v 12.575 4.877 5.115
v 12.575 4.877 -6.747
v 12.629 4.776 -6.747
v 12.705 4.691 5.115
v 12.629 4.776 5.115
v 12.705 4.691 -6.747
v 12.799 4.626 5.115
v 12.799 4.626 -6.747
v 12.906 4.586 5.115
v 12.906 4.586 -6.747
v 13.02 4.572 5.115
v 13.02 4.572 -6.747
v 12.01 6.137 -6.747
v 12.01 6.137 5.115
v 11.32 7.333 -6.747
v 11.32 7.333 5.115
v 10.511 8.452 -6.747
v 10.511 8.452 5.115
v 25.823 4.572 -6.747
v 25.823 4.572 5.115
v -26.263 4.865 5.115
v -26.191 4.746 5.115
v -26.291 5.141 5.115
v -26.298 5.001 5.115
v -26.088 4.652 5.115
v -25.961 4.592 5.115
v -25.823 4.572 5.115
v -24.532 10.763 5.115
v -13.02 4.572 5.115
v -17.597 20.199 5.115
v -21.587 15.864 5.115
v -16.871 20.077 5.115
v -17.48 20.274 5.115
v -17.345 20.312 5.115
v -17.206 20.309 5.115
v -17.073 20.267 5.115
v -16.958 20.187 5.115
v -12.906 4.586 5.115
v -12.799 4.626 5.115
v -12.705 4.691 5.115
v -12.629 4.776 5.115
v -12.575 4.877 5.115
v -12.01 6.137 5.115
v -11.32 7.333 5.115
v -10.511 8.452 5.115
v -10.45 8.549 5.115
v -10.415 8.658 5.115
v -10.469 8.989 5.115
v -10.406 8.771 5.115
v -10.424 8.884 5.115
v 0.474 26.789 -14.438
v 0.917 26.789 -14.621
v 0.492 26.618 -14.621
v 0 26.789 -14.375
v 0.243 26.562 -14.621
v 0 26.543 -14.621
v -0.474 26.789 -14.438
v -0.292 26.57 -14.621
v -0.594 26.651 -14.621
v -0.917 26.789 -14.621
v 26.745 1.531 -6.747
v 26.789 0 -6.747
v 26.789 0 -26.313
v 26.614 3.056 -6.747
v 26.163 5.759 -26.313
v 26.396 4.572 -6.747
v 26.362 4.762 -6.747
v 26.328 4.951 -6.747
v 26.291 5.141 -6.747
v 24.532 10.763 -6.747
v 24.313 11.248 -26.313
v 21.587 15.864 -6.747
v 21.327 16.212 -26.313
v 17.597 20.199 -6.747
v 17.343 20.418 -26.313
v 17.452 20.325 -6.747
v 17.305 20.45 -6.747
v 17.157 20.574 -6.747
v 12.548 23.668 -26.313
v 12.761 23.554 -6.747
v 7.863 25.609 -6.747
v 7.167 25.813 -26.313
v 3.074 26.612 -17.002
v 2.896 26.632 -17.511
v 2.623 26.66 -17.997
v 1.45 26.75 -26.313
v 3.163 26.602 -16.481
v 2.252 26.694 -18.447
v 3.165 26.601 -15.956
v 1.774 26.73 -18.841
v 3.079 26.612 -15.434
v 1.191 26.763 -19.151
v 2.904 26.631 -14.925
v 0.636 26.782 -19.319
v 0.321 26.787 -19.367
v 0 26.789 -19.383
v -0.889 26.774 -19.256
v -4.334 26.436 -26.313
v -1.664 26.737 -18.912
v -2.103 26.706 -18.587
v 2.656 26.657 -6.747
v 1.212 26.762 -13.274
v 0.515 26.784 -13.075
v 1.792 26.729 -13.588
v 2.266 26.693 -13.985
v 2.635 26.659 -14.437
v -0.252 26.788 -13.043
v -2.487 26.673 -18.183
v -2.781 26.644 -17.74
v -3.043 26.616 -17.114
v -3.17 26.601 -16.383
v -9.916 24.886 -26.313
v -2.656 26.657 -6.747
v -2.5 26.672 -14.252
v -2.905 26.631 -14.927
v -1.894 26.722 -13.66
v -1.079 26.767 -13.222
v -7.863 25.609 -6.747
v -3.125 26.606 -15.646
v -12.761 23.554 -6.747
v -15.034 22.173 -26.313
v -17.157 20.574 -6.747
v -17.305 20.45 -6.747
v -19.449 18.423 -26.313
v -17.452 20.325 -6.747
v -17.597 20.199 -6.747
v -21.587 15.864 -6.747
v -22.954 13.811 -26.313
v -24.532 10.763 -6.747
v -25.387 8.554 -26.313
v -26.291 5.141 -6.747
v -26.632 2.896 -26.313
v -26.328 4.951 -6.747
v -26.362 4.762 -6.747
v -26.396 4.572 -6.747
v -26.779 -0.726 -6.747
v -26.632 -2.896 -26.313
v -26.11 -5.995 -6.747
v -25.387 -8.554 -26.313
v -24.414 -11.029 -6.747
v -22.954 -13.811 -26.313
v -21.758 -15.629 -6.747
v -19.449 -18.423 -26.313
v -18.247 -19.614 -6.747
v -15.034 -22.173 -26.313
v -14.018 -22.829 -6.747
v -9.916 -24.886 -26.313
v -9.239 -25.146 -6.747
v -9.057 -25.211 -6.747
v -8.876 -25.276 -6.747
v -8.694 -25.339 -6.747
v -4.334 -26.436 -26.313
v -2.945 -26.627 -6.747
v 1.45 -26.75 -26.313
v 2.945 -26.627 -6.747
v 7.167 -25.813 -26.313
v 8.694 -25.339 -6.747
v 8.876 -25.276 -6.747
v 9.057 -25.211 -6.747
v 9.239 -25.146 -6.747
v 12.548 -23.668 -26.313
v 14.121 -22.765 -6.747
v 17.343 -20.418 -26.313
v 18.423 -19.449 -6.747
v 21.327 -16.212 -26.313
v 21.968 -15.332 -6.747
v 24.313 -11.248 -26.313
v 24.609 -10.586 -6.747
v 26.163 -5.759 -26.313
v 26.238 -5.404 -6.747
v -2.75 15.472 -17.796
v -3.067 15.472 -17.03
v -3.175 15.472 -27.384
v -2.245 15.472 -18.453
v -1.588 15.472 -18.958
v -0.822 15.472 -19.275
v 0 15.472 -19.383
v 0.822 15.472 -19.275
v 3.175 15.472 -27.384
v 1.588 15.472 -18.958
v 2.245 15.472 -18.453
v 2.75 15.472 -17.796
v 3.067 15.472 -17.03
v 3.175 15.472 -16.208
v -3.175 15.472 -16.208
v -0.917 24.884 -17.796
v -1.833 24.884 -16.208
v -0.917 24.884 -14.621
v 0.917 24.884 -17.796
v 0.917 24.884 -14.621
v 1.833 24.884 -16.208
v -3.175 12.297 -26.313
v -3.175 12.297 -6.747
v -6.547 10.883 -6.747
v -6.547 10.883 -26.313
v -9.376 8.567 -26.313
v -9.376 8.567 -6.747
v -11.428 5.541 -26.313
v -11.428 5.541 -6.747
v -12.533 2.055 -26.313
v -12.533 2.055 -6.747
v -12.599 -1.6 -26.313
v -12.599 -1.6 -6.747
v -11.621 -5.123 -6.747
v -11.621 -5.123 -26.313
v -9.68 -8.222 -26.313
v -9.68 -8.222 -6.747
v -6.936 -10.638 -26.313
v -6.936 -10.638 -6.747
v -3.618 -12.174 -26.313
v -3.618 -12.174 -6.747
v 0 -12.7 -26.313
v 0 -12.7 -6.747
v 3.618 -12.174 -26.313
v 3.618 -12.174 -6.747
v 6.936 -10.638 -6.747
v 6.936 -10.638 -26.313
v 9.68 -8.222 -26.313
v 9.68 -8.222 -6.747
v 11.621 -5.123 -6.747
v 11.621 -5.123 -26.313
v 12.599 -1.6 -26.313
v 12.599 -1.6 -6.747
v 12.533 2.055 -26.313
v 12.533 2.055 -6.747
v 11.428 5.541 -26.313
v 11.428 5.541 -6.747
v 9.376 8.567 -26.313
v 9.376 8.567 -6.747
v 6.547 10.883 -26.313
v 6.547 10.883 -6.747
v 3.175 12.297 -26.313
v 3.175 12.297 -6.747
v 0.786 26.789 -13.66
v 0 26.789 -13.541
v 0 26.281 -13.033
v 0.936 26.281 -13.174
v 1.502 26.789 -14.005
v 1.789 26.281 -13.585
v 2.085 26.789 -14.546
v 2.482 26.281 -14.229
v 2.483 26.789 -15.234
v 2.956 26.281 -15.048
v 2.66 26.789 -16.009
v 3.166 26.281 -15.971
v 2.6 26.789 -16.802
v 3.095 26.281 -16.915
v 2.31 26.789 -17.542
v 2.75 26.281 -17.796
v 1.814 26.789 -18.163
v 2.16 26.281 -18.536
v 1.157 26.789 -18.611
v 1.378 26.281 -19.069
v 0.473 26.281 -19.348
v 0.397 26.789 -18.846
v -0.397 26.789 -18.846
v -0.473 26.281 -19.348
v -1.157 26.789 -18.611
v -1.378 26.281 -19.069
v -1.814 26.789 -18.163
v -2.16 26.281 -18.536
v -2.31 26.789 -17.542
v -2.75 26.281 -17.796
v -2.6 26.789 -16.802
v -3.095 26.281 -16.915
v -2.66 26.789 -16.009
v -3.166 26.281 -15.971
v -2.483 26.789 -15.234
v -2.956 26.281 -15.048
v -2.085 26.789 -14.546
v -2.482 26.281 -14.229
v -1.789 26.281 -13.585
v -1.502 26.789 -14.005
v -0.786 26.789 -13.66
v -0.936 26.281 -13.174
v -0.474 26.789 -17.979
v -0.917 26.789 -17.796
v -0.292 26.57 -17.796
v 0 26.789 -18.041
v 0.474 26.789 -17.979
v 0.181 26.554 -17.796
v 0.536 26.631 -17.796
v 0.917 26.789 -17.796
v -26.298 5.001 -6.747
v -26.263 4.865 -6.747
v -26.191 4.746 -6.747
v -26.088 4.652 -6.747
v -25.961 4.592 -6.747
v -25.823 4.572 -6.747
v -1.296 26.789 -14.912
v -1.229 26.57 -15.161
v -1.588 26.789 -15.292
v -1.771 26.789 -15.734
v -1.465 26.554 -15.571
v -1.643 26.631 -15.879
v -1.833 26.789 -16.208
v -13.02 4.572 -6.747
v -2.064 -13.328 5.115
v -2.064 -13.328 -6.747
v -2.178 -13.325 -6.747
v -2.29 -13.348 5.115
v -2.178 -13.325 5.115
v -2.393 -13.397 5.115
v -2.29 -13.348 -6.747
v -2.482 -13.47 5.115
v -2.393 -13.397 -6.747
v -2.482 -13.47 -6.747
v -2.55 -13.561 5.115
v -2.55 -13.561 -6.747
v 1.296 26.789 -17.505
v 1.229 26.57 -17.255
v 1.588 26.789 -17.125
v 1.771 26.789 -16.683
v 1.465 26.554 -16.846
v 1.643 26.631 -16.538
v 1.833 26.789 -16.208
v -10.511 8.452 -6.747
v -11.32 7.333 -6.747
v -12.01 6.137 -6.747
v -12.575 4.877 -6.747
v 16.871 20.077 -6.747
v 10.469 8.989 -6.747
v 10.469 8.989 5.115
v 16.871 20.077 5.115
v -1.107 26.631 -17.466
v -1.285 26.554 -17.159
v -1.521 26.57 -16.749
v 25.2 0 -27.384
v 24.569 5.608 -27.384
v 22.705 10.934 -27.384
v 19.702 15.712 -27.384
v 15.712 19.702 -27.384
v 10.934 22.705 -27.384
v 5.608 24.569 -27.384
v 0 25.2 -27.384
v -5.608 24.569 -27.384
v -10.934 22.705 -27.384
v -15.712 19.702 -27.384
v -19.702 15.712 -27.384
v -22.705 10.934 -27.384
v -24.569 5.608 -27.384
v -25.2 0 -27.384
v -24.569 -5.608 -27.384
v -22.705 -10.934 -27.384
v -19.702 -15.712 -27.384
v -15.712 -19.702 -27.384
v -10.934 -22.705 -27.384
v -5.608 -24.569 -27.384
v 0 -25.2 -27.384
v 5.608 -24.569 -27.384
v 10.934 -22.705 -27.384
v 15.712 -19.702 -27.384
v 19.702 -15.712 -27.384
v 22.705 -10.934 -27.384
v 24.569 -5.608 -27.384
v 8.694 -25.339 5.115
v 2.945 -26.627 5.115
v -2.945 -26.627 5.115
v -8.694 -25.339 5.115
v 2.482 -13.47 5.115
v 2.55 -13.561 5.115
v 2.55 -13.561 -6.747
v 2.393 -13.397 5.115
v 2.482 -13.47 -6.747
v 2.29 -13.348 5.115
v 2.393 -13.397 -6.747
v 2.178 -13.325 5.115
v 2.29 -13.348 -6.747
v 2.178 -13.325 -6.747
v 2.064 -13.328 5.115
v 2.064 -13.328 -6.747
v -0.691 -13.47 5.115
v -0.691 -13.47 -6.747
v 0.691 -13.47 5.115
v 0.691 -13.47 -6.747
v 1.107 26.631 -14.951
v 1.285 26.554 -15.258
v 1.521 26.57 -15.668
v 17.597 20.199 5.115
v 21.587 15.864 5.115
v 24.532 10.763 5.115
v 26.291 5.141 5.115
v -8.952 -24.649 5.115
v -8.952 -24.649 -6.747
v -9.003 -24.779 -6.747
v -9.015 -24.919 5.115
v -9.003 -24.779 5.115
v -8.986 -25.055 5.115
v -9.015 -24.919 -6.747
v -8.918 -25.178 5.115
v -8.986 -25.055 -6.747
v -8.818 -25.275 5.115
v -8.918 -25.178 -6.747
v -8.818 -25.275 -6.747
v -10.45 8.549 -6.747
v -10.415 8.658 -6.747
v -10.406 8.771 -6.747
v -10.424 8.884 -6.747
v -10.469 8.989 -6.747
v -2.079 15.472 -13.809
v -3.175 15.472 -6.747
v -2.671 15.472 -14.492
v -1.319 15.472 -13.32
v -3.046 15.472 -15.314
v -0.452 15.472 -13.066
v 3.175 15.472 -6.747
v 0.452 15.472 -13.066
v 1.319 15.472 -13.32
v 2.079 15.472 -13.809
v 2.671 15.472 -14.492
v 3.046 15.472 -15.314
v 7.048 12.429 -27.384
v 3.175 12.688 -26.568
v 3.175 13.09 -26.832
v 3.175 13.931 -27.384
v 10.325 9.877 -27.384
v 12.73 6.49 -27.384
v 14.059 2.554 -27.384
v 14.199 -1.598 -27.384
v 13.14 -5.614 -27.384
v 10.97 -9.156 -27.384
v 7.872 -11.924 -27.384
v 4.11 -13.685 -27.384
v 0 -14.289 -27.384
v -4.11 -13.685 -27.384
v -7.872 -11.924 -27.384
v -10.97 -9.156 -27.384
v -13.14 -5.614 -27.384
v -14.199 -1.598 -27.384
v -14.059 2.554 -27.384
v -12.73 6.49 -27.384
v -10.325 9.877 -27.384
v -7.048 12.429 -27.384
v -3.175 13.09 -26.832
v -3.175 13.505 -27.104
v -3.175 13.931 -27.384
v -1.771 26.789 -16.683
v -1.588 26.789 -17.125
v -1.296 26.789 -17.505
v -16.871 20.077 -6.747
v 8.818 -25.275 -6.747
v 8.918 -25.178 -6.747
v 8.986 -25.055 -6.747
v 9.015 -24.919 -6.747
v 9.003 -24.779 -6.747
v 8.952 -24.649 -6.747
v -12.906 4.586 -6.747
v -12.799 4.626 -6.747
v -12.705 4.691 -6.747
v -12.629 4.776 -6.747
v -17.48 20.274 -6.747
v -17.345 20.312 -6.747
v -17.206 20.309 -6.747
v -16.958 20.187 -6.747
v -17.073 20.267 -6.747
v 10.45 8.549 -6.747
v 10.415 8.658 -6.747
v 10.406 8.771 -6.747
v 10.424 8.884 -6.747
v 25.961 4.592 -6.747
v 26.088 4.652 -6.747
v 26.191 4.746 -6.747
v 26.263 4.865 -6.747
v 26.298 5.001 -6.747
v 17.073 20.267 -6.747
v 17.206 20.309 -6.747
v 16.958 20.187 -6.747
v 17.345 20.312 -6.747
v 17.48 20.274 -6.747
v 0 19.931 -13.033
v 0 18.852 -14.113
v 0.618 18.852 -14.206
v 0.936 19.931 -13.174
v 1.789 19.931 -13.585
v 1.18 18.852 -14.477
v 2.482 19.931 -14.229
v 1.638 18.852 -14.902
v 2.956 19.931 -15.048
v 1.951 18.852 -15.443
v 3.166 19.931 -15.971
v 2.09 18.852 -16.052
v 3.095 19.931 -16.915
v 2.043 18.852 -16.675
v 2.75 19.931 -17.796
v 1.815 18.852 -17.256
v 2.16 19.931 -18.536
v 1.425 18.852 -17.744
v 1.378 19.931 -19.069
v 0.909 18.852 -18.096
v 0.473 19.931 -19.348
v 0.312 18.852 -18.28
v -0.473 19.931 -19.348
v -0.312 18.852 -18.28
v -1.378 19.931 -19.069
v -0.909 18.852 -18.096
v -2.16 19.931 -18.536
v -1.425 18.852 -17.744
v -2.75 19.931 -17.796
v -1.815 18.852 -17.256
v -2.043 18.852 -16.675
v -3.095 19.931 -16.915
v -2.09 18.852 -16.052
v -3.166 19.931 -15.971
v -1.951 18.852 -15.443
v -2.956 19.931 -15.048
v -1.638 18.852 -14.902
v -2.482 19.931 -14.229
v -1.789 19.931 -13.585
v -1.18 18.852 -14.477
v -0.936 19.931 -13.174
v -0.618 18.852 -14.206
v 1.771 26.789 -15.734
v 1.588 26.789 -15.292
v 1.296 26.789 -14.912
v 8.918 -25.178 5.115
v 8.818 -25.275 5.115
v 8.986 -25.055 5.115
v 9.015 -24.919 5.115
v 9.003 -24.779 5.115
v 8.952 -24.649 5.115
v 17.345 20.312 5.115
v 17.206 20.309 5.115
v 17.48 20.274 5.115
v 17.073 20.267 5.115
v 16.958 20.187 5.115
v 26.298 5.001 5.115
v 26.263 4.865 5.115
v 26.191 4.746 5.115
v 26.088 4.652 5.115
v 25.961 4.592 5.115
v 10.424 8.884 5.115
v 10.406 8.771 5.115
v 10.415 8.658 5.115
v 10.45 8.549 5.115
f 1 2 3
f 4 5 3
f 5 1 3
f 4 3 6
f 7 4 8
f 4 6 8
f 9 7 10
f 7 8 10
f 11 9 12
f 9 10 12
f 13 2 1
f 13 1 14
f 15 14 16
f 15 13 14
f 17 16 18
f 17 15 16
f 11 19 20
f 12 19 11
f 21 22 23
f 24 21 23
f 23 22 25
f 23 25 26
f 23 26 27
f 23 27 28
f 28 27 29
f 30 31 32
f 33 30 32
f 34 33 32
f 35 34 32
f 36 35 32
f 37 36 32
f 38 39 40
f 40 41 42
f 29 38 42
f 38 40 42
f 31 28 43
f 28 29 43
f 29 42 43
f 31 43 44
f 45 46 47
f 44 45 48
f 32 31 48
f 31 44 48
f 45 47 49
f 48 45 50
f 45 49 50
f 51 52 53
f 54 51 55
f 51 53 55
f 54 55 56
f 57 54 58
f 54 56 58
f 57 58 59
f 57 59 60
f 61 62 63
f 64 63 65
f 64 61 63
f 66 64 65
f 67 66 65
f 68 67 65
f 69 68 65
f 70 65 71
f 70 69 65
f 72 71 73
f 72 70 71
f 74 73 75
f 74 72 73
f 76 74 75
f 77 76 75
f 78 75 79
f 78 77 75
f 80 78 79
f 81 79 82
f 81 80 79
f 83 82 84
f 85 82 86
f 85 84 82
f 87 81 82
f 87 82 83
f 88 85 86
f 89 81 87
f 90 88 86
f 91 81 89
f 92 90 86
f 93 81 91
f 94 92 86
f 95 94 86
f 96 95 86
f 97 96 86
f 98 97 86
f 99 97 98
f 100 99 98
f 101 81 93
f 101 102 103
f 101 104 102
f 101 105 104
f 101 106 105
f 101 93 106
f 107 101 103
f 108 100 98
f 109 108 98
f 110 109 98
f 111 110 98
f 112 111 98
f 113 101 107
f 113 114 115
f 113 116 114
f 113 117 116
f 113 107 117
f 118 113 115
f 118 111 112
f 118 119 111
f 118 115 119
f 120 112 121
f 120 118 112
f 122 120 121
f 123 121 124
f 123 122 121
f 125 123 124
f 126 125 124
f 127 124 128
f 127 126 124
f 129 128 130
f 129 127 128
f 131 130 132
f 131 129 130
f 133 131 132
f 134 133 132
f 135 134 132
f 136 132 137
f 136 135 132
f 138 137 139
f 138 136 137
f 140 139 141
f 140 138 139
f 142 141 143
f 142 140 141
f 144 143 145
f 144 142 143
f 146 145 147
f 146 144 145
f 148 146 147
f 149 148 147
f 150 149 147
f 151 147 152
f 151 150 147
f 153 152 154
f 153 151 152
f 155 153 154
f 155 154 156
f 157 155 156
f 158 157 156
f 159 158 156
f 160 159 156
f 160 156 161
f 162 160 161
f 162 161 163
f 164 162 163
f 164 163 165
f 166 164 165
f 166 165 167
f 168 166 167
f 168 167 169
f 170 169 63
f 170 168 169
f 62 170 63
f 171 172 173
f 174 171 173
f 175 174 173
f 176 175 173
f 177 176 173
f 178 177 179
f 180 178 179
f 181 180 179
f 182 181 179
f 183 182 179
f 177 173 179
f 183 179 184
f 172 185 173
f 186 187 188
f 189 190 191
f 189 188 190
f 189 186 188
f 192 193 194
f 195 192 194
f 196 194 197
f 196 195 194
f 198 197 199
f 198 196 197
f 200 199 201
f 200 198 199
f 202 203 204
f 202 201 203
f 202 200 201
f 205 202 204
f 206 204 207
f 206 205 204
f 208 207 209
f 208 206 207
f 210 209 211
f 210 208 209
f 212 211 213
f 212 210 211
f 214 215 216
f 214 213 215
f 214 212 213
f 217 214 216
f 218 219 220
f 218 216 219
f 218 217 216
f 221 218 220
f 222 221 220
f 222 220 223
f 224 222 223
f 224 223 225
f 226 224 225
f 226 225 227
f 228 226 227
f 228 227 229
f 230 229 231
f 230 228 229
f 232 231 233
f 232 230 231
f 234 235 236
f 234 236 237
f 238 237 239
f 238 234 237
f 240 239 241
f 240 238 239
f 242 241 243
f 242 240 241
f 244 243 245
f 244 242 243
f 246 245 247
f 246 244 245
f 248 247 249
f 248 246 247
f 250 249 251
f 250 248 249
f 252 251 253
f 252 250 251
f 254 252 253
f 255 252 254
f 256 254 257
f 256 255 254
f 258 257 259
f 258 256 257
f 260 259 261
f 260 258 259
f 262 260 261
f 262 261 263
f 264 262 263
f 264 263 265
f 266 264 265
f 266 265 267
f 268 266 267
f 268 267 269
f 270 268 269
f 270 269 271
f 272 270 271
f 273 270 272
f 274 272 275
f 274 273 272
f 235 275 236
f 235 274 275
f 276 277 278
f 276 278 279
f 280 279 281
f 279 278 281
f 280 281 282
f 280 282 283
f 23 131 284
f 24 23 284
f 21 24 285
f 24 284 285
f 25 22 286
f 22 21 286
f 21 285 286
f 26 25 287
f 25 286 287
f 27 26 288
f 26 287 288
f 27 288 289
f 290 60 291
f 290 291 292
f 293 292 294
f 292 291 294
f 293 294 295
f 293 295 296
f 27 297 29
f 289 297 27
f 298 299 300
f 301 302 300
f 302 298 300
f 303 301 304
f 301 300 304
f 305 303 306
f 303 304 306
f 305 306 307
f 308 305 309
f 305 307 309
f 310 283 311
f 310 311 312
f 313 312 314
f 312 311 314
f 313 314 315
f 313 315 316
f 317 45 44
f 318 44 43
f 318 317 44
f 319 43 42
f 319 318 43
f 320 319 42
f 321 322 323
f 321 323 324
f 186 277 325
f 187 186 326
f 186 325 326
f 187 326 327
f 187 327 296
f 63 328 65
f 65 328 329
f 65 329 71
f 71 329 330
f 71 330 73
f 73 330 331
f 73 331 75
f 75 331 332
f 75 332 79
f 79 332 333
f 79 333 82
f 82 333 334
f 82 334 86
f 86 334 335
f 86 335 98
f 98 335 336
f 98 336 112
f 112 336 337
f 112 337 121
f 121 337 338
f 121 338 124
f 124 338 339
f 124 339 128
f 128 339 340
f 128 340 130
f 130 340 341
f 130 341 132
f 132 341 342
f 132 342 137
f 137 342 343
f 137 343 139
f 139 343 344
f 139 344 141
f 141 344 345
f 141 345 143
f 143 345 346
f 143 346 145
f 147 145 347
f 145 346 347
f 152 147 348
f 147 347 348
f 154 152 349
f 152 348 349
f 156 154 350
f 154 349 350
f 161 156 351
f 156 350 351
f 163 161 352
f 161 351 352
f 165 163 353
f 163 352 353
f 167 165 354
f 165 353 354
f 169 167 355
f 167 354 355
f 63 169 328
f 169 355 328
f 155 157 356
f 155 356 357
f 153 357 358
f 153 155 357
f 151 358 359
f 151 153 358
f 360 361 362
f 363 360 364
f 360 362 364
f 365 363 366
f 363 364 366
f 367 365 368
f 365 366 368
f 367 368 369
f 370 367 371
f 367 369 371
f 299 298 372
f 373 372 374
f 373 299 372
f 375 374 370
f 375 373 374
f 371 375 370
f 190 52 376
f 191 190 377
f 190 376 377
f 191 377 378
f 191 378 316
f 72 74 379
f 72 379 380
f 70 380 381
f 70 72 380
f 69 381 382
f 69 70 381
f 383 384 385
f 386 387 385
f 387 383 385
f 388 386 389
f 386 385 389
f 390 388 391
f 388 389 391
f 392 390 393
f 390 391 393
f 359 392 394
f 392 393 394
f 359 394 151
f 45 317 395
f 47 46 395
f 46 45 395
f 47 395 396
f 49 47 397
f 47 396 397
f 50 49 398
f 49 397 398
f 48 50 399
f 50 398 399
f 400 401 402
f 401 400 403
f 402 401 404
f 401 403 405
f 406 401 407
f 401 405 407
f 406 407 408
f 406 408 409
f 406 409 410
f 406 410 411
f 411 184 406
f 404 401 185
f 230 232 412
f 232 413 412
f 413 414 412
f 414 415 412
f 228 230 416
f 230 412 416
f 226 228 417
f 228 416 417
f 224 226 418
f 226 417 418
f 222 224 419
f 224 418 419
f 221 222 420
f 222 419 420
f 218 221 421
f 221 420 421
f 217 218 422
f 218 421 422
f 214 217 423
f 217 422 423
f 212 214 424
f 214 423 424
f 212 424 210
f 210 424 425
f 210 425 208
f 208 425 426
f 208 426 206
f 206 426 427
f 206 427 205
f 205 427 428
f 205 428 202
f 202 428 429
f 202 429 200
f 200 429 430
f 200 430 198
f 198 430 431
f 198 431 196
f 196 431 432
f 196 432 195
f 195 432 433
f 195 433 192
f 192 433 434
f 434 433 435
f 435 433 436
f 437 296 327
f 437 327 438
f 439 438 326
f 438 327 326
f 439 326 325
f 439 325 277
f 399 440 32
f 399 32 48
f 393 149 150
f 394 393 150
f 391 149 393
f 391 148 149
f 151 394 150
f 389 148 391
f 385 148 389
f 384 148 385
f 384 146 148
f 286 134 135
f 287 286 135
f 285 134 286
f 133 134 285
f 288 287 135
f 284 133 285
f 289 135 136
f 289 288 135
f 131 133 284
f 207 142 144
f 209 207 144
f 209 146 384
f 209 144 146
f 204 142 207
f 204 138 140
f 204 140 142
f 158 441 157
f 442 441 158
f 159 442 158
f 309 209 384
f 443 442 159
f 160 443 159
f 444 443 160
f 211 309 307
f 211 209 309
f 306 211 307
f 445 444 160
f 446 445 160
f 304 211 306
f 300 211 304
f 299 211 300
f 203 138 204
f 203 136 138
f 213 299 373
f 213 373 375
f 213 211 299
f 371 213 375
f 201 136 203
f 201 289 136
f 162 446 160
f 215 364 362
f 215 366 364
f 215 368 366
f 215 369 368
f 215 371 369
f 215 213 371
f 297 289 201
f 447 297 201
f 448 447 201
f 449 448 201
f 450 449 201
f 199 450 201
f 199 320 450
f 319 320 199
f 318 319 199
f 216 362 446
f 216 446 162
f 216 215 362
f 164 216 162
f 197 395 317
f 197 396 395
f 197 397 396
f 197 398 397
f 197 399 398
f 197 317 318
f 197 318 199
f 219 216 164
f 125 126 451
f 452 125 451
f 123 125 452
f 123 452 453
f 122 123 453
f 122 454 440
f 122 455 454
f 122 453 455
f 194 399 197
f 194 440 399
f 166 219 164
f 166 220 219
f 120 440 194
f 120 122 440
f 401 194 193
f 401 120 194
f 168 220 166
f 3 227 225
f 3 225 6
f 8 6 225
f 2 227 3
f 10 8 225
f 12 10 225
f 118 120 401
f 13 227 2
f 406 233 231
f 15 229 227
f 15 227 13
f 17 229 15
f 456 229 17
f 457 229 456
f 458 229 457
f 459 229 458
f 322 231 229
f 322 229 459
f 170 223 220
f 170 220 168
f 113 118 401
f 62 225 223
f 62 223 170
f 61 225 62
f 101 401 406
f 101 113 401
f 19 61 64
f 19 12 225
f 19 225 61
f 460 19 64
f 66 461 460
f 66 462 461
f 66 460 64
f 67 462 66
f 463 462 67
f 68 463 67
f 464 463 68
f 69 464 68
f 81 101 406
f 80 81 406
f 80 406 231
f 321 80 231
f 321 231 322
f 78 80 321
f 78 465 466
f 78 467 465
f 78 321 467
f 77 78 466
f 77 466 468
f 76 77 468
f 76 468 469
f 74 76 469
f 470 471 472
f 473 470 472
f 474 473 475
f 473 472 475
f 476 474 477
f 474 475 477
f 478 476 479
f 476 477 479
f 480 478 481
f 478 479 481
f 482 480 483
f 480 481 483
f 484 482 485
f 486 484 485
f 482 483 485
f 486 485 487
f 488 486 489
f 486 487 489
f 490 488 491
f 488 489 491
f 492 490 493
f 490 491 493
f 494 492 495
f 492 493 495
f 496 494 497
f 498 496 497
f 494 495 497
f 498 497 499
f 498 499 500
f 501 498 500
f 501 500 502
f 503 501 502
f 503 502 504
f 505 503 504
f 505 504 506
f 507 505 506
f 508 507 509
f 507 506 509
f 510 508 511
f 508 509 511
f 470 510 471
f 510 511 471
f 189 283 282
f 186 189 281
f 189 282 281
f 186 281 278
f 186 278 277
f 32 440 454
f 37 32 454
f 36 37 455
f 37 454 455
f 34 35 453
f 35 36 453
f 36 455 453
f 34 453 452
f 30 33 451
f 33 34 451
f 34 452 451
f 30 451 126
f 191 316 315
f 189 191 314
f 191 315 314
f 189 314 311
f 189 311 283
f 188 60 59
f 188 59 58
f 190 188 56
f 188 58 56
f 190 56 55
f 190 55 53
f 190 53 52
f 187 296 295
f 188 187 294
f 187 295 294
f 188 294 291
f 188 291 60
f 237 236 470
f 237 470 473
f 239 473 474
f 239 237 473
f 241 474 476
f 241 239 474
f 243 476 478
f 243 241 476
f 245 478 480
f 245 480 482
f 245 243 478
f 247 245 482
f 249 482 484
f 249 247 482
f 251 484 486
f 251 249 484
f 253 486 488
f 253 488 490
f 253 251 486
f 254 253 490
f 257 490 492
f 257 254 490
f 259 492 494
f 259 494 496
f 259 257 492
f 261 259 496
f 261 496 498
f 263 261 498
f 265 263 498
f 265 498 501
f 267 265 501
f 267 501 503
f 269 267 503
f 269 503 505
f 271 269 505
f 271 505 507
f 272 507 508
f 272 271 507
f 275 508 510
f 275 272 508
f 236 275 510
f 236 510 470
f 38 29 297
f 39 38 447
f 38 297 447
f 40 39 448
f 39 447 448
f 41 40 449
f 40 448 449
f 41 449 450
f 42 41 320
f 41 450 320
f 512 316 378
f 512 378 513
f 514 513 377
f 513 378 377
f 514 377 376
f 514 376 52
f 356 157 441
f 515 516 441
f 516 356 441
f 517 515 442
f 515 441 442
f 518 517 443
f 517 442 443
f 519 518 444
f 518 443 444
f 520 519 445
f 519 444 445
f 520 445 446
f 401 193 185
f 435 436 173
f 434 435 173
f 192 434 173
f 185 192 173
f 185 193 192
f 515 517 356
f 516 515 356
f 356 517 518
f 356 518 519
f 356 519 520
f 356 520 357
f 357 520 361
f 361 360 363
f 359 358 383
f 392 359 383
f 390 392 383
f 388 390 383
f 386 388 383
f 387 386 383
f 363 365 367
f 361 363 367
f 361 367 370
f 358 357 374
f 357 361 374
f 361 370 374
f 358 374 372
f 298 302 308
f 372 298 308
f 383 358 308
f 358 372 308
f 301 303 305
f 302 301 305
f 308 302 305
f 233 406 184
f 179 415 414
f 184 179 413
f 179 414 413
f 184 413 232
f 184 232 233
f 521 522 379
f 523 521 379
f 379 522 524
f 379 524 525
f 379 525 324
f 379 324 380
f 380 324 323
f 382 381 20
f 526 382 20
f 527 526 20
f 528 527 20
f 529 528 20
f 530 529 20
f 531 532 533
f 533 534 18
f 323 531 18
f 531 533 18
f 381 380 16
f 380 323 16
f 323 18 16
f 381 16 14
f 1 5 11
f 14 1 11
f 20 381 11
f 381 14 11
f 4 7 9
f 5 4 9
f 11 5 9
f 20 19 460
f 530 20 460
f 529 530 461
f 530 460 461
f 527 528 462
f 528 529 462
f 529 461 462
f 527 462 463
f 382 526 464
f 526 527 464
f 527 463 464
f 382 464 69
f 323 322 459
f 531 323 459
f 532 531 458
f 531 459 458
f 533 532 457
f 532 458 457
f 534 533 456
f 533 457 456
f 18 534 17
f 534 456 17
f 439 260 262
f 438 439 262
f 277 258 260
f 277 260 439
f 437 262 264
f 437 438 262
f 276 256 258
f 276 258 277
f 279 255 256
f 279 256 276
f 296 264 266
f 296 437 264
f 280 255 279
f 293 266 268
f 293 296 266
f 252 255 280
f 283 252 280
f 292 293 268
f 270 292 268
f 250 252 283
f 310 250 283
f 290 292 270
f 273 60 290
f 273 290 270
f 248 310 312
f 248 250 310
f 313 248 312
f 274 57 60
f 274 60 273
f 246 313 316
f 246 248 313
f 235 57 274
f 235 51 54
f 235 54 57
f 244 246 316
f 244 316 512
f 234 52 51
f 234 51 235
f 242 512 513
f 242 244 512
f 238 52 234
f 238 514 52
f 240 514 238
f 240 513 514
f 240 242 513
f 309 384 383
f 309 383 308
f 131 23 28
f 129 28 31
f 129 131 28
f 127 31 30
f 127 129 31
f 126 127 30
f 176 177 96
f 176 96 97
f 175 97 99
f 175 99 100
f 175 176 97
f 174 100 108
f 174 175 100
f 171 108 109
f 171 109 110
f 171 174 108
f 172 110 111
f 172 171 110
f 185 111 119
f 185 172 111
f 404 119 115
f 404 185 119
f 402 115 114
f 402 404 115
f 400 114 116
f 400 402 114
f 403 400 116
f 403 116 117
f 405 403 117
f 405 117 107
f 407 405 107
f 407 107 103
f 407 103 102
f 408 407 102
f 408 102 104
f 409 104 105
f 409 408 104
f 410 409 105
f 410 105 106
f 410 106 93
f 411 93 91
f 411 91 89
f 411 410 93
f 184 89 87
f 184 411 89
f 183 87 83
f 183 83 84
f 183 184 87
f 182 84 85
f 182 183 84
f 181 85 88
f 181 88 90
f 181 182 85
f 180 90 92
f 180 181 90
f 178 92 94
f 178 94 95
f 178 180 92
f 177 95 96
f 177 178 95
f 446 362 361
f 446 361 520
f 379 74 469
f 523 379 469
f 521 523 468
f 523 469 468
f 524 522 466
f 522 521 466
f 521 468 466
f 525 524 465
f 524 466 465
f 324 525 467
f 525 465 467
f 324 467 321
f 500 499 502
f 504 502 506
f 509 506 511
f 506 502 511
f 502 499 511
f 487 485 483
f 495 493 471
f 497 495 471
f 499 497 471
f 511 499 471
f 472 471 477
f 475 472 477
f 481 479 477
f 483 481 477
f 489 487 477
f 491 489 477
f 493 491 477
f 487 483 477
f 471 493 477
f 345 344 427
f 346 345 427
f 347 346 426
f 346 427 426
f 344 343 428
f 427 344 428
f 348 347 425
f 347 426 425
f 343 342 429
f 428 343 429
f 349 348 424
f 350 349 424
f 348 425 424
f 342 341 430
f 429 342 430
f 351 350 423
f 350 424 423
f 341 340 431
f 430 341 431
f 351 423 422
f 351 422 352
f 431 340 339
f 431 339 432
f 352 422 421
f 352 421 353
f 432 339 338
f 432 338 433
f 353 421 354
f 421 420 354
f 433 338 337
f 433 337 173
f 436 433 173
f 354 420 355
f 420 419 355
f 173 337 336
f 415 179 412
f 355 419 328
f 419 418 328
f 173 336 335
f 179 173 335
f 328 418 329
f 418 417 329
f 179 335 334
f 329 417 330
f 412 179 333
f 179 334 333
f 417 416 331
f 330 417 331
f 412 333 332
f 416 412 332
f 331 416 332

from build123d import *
from OCP.BRepFilletAPI import BRepFilletAPI_MakeChamfer

# Parameters (mm, degrees)
BOSS_EXTRUDE1_START      = -6.746875
SKETCH1_R                = 26.7890625
BOSS_EXTRUDE1_DEPTH      = 20.6375
BOSS_EXTRUDE2_DEPTH      = 11.8618
FILLET1_R                = 0.476990821
CIRPATTERN1_COUNT        = 3
FILLET1_OF_CIRPATTERN1_R = 0.476990821
CUT_EXTRUDE5_DEPTH       = 47.746248335
CUT_EXTRUDE5_DEPTH_BACK  = 47.746248335
SKETCH15_R               = 12.7
CHAMFER1_SIZE            = 1.0715625
CHAMFER1_SIZE2           = 1.588656738
CUT_EXTRUDE1_DEPTH       = 47.746248335
CUT_EXTRUDE1_DEPTH_BACK  = 47.746248335
SKETCH5_R                = 3.175
CUT_EXTRUDE2_DEPTH       = 47.746248335
SKETCH6_R                = 3.175
BOSS_EXTRUDE3_DEPTH      = 7.9375
CUT_EXTRUDE3_DEPTH       = 1.905
CHAMFER3_SIZE            = 0.508
CHAMFER4_SIZE            = 1.0795


with BuildPart() as part:
    # Sketch1 → Boss-Extrude1 (new body)
    with BuildSketch(Plane.XY.offset(BOSS_EXTRUDE1_START)):
        Circle(SKETCH1_R)
    extrude(amount=-BOSS_EXTRUDE1_DEPTH)

    # Sketch2 → Boss-Extrude2 (add)
    with BuildSketch(Plane.XY.offset(-6.746875)):
        with BuildLine():
            Line((-9.238549561, -25.145637229), (-2.384954104, -13.274861682))
            ThreePointArc((-2.384954104, -13.274861682), (0, -13.4874), (2.384954104, -13.274861682))
            Line((2.384954104, -13.274861682), (9.238549561, -25.145637229))
            ThreePointArc((9.238549561, -25.145637229), (0, -26.7890625), (-9.238549561, -25.145637229))
        make_face()
    boss_extrude2 = extrude(amount=BOSS_EXTRUDE2_DEPTH)

    # Fillet1
    # the kernel refuses this fillet: 0.476990821 mm, written as the material it takes off along each edge
    with BuildSketch(Plane(origin=(-9.238549561, -25.145637229, -6.746875), x_dir=(0.9423194959651416, -0.33471475546202245, 0), z_dir=(0, 0, 1))) as fillet1_piece_1:
        with BuildLine():
            CenterArc((0.572952448, 0.476963054), FILLET1_R, 169.55519331, 101.063030663)
            Line((0.103865366, 0.563435893), (0, 0))
            ThreePointArc((0, 0), (0.28904955, -0.001559444), (0.5780991, 0))
        make_face()
    extrude(amount=13.307047751, mode=Mode.SUBTRACT)
    with BuildSketch(Plane(origin=(9.238549561, -25.145637229, -6.746875), x_dir=(-0.9423194959651411, -0.3347147554620237, 0), z_dir=(0, 0, 1))) as fillet1_piece_2:
        with BuildLine():
            CenterArc((0.572952448, -0.476963054), FILLET1_R, 89.381776027, 101.063030663)
            Line((0.103865366, -0.563435893), (0, 0))
            ThreePointArc((0, 0), (0.28904955, 0.001559444), (0.5780991, 0))
        make_face()
    extrude(amount=13.307047751, mode=Mode.SUBTRACT)
    with BuildSketch(Plane(origin=(2.384954104, -13.274861682, -6.746875), x_dir=(0.49999999999999706, -0.8660254037844404, 0), z_dir=(0, 0, 1))) as fillet1_piece_3:
        with BuildLine():
            CenterArc((0.330829178, -0.476990821), FILLET1_R, 90, 68.803855098)
            ThreePointArc((-0.113892323, -0.304529143), (-0.056028498, -0.152607773), (0, 0))
            Line((0, 0), (0.330829178, 0))
        make_face()
    extrude(amount=12.688872944, mode=Mode.SUBTRACT)
    with BuildSketch(Plane(origin=(-2.384954104, -13.274861682, -6.746875), x_dir=(0.9863015455813384, -0.16495229972286882, 0), z_dir=(0, 0, 1))) as fillet1_piece_4:
        with BuildLine():
            CenterArc((0.330879129, -0.476956172), FILLET1_R, 90.690608377, 68.803855098)
            Line((-0.115888763, -0.309867293), (0, 0))
            ThreePointArc((0, 0), (0.162564956, -0.000979741), (0.325129912, 0))
        make_face()
    extrude(amount=12.688872944, mode=Mode.SUBTRACT)

    # CirPattern1: Boss-Extrude2 ×3 about axis
    cirpattern1_axis = Axis((0, 0, 0), (0, 0, 1))
    for i in range(1, CIRPATTERN1_COUNT):
        add(boss_extrude2.rotate(cirpattern1_axis, i * 360 / CIRPATTERN1_COUNT))

    # Fillet1 of CirPattern1
    # the kernel refuses this fillet: 0.476990821 mm, written as the material it takes off along each edge
    with BuildSketch(Plane(origin=(26.396035415, 4.572, -6.746875), x_dir=(-0.18128826673094764, 0.9834299997181745, 0), z_dir=(0, 0, 1)), Plane(origin=(-17.157485854, 20.573637229, -6.746875), x_dir=(-0.761031229234182, -0.6487152442561451, 0), z_dir=(0, 0, 1))) as fillet1_of_cirpattern1_piece_1:
        with BuildLine():
            CenterArc((0.572952448, 0.476963054), FILLET1_OF_CIRPATTERN1_R, 169.55519331, 101.063030663)
            Line((0.103865366, 0.563435893), (0, 0))
            ThreePointArc((0, 0), (0.28904955, -0.001559444), (0.5780991, 0))
        make_face()
    extrude(amount=13.307047751, mode=Mode.SUBTRACT)
    with BuildSketch(Plane(origin=(17.157485854, 20.573637229, -6.746875), x_dir=(0.7610312292341833, -0.6487152442561435, 0), z_dir=(0, 0, 1)), Plane(origin=(-26.396035415, 4.572, -6.746875), x_dir=(0.181288266730962, 0.9834299997181718, 0), z_dir=(0, 0, 1))) as fillet1_of_cirpattern1_piece_2:
        with BuildLine():
            CenterArc((0.572952448, -0.476963054), FILLET1_OF_CIRPATTERN1_R, 89.381776027, 101.063030663)
            Line((0.103865366, -0.563435893), (0, 0))
            ThreePointArc((0, 0), (0.28904955, 0.001559444), (0.5780991, 0))
        make_face()
    extrude(amount=13.307047751, mode=Mode.SUBTRACT)
    with BuildSketch(Plane(origin=(10.303890396, 8.702861682, -6.746875), x_dir=(0.5000000000000006, 0.8660254037844383, 0), z_dir=(0, 0, 1)), Plane(origin=(-12.688844501, 4.572, -6.746875), x_dir=(-1, 0, 0), z_dir=(0, 0, 1))) as fillet1_of_cirpattern1_piece_3:
        with BuildLine():
            CenterArc((0.330829178, -0.476990821), FILLET1_OF_CIRPATTERN1_R, 90, 68.803855098)
            ThreePointArc((-0.113892323, -0.304529143), (-0.056028498, -0.152607773), (0, 0))
            Line((0, 0), (0.330829178, 0))
        make_face()
    extrude(amount=12.688872944, mode=Mode.SUBTRACT)
    with BuildSketch(Plane(origin=(12.688844501, 4.572, -6.746875), x_dir=(-0.3502978908180006, 0.9366383441267288, 0), z_dir=(0, 0, 1)), Plane(origin=(-10.303890396, 8.702861682, -6.746875), x_dir=(-0.6360036547633316, -0.7716860444038657, 0), z_dir=(0, 0, 1))) as fillet1_of_cirpattern1_piece_4:
        with BuildLine():
            CenterArc((0.330879129, -0.476956172), FILLET1_OF_CIRPATTERN1_R, 90.690608377, 68.803855098)
            Line((-0.115888763, -0.309867293), (0, 0))
            ThreePointArc((0, 0), (0.162564956, -0.000979741), (0.325129912, 0))
        make_face()
    extrude(amount=12.688872944, mode=Mode.SUBTRACT)

    # Sketch15 → Cut-Extrude5 (cut, two sides: drawn at the far end of the back side and taken through both)
    with BuildSketch(Plane.XY.offset(-CUT_EXTRUDE5_DEPTH_BACK)):
        Circle(SKETCH15_R)
    extrude(amount=CUT_EXTRUDE5_DEPTH + CUT_EXTRUDE5_DEPTH_BACK, mode=Mode.SUBTRACT)

    # Chamfer1: one chamfer whose edges measure the first distance from different faces: ONE call of the kernel's chamfer builder (chamfer() names one face for all edges)
    chamfer1_edges_1 = [part.edges().sort_by_distance(p)[0] for p in [
        (-26.7890625, 0, -27.384375),
    ]]
    chamfer1_side_1 = [part.faces().sort_by_distance(p)[0] for p in [
        (-26.7890625, 0, -17.065625),
    ]]
    chamfer1_edges_2 = [part.edges().sort_by_distance(p)[0] for p in [
        (-12.7, 0, -27.384375),
    ]]
    chamfer1_side_2 = [part.faces().sort_by_distance(p)[0] for p in [
        (-12.7, 0, -17.065625),
    ]]
    chamfer1 = BRepFilletAPI_MakeChamfer(part.part.solid().wrapped)
    for e in chamfer1_edges_1:
        chamfer1.Add(CHAMFER1_SIZE, CHAMFER1_SIZE2, e.wrapped, chamfer1_side_1[0].wrapped)  # the first distance lies on this face
    for e in chamfer1_edges_2:
        chamfer1.Add(CHAMFER1_SIZE, CHAMFER1_SIZE2, e.wrapped, chamfer1_side_2[0].wrapped)  # the first distance lies on this face
    add(Compound.cast(chamfer1.Shape()), mode=Mode.REPLACE)

    # Sketch4 → Cut-Extrude1 (cut, two sides: drawn at the far end of the back side and taken through both)
    with BuildSketch(Plane.XY.offset(-CUT_EXTRUDE1_DEPTH_BACK)):
        with BuildLine():
            Line((-3.175, 15.471722124), (3.175, 15.471722124))
            Line((3.175, 15.471722124), (3.175, 12.296722124))
            ThreePointArc((3.175, 12.296722124), (0, 12.7), (-3.175, 12.296722124))
            Line((-3.175, 12.296722124), (-3.175, 15.471722124))
        make_face()
    extrude(amount=CUT_EXTRUDE1_DEPTH + CUT_EXTRUDE1_DEPTH_BACK, mode=Mode.SUBTRACT)

    # Sketch5 → Cut-Extrude2 (cut, through all)
    with BuildSketch(Plane(origin=(0, 0, 0), x_dir=(1, 0, 0), z_dir=(0, 1, 0))):
        with Locations(Location((0, 16.208375, 0), (0, 0, 90))):
            Circle(SKETCH5_R)
    extrude(amount=CUT_EXTRUDE2_DEPTH, mode=Mode.SUBTRACT)


with BuildPart() as body_2:
    # Sketch6 → Boss-Extrude3 (new body)
    with BuildSketch(Plane(origin=(0, 26.7890625, 0), x_dir=(-1, 0, 0), z_dir=(0, 1, 0))):
        with Locations(Location((0, -16.208375, 0), (0, 0, 90))):
            Circle(SKETCH6_R)
    extrude(amount=-BOSS_EXTRUDE3_DEPTH)

    # Sketch8 → Cut-Extrude3 (cut)
    with BuildSketch(Plane(origin=(0, 26.7890625, 0), x_dir=(1, 0, 0), z_dir=(0, 1, 0))):
        Polygon((0.916543552, 14.620875), (1.833087105, 16.208375), (0.916543552, 17.795875), (-0.916543552, 17.795875), (-1.833087105, 16.208375), (-0.916543552, 14.620875), align=None)
    extrude(amount=-CUT_EXTRUDE3_DEPTH, mode=Mode.SUBTRACT)

    # Cut-Extrude4 cone 1 section (through the dimple's axis) → Cut-Extrude4 (revolve, cut)
    with BuildSketch(Plane(origin=(0, 26.7890625, -16.208375), x_dir=(0, 0, 1), z_dir=(1, 0, 0))):
        Polygon((0, 0), (1.833087105, 0), (0, 1.833087105), align=None)
    revolve(axis=Axis((0, 26.7890625, -16.208375), (0, -1, 0)), mode=Mode.SUBTRACT)

    # Chamfer3
    chamfer3_edges = [body_2.edges().sort_by_distance(p)[0] for p in [
        (0, 26.7890625, -19.383375),
    ]]
    chamfer(chamfer3_edges, length=CHAMFER3_SIZE)

    # Chamfer4
    chamfer4_edges = [body_2.edges().sort_by_distance(p)[0] for p in [
        (0, 18.8515625, -19.383375),
    ]]
    chamfer(chamfer4_edges, length=CHAMFER4_SIZE)


solid = Compound([part.part, body_2.part])
